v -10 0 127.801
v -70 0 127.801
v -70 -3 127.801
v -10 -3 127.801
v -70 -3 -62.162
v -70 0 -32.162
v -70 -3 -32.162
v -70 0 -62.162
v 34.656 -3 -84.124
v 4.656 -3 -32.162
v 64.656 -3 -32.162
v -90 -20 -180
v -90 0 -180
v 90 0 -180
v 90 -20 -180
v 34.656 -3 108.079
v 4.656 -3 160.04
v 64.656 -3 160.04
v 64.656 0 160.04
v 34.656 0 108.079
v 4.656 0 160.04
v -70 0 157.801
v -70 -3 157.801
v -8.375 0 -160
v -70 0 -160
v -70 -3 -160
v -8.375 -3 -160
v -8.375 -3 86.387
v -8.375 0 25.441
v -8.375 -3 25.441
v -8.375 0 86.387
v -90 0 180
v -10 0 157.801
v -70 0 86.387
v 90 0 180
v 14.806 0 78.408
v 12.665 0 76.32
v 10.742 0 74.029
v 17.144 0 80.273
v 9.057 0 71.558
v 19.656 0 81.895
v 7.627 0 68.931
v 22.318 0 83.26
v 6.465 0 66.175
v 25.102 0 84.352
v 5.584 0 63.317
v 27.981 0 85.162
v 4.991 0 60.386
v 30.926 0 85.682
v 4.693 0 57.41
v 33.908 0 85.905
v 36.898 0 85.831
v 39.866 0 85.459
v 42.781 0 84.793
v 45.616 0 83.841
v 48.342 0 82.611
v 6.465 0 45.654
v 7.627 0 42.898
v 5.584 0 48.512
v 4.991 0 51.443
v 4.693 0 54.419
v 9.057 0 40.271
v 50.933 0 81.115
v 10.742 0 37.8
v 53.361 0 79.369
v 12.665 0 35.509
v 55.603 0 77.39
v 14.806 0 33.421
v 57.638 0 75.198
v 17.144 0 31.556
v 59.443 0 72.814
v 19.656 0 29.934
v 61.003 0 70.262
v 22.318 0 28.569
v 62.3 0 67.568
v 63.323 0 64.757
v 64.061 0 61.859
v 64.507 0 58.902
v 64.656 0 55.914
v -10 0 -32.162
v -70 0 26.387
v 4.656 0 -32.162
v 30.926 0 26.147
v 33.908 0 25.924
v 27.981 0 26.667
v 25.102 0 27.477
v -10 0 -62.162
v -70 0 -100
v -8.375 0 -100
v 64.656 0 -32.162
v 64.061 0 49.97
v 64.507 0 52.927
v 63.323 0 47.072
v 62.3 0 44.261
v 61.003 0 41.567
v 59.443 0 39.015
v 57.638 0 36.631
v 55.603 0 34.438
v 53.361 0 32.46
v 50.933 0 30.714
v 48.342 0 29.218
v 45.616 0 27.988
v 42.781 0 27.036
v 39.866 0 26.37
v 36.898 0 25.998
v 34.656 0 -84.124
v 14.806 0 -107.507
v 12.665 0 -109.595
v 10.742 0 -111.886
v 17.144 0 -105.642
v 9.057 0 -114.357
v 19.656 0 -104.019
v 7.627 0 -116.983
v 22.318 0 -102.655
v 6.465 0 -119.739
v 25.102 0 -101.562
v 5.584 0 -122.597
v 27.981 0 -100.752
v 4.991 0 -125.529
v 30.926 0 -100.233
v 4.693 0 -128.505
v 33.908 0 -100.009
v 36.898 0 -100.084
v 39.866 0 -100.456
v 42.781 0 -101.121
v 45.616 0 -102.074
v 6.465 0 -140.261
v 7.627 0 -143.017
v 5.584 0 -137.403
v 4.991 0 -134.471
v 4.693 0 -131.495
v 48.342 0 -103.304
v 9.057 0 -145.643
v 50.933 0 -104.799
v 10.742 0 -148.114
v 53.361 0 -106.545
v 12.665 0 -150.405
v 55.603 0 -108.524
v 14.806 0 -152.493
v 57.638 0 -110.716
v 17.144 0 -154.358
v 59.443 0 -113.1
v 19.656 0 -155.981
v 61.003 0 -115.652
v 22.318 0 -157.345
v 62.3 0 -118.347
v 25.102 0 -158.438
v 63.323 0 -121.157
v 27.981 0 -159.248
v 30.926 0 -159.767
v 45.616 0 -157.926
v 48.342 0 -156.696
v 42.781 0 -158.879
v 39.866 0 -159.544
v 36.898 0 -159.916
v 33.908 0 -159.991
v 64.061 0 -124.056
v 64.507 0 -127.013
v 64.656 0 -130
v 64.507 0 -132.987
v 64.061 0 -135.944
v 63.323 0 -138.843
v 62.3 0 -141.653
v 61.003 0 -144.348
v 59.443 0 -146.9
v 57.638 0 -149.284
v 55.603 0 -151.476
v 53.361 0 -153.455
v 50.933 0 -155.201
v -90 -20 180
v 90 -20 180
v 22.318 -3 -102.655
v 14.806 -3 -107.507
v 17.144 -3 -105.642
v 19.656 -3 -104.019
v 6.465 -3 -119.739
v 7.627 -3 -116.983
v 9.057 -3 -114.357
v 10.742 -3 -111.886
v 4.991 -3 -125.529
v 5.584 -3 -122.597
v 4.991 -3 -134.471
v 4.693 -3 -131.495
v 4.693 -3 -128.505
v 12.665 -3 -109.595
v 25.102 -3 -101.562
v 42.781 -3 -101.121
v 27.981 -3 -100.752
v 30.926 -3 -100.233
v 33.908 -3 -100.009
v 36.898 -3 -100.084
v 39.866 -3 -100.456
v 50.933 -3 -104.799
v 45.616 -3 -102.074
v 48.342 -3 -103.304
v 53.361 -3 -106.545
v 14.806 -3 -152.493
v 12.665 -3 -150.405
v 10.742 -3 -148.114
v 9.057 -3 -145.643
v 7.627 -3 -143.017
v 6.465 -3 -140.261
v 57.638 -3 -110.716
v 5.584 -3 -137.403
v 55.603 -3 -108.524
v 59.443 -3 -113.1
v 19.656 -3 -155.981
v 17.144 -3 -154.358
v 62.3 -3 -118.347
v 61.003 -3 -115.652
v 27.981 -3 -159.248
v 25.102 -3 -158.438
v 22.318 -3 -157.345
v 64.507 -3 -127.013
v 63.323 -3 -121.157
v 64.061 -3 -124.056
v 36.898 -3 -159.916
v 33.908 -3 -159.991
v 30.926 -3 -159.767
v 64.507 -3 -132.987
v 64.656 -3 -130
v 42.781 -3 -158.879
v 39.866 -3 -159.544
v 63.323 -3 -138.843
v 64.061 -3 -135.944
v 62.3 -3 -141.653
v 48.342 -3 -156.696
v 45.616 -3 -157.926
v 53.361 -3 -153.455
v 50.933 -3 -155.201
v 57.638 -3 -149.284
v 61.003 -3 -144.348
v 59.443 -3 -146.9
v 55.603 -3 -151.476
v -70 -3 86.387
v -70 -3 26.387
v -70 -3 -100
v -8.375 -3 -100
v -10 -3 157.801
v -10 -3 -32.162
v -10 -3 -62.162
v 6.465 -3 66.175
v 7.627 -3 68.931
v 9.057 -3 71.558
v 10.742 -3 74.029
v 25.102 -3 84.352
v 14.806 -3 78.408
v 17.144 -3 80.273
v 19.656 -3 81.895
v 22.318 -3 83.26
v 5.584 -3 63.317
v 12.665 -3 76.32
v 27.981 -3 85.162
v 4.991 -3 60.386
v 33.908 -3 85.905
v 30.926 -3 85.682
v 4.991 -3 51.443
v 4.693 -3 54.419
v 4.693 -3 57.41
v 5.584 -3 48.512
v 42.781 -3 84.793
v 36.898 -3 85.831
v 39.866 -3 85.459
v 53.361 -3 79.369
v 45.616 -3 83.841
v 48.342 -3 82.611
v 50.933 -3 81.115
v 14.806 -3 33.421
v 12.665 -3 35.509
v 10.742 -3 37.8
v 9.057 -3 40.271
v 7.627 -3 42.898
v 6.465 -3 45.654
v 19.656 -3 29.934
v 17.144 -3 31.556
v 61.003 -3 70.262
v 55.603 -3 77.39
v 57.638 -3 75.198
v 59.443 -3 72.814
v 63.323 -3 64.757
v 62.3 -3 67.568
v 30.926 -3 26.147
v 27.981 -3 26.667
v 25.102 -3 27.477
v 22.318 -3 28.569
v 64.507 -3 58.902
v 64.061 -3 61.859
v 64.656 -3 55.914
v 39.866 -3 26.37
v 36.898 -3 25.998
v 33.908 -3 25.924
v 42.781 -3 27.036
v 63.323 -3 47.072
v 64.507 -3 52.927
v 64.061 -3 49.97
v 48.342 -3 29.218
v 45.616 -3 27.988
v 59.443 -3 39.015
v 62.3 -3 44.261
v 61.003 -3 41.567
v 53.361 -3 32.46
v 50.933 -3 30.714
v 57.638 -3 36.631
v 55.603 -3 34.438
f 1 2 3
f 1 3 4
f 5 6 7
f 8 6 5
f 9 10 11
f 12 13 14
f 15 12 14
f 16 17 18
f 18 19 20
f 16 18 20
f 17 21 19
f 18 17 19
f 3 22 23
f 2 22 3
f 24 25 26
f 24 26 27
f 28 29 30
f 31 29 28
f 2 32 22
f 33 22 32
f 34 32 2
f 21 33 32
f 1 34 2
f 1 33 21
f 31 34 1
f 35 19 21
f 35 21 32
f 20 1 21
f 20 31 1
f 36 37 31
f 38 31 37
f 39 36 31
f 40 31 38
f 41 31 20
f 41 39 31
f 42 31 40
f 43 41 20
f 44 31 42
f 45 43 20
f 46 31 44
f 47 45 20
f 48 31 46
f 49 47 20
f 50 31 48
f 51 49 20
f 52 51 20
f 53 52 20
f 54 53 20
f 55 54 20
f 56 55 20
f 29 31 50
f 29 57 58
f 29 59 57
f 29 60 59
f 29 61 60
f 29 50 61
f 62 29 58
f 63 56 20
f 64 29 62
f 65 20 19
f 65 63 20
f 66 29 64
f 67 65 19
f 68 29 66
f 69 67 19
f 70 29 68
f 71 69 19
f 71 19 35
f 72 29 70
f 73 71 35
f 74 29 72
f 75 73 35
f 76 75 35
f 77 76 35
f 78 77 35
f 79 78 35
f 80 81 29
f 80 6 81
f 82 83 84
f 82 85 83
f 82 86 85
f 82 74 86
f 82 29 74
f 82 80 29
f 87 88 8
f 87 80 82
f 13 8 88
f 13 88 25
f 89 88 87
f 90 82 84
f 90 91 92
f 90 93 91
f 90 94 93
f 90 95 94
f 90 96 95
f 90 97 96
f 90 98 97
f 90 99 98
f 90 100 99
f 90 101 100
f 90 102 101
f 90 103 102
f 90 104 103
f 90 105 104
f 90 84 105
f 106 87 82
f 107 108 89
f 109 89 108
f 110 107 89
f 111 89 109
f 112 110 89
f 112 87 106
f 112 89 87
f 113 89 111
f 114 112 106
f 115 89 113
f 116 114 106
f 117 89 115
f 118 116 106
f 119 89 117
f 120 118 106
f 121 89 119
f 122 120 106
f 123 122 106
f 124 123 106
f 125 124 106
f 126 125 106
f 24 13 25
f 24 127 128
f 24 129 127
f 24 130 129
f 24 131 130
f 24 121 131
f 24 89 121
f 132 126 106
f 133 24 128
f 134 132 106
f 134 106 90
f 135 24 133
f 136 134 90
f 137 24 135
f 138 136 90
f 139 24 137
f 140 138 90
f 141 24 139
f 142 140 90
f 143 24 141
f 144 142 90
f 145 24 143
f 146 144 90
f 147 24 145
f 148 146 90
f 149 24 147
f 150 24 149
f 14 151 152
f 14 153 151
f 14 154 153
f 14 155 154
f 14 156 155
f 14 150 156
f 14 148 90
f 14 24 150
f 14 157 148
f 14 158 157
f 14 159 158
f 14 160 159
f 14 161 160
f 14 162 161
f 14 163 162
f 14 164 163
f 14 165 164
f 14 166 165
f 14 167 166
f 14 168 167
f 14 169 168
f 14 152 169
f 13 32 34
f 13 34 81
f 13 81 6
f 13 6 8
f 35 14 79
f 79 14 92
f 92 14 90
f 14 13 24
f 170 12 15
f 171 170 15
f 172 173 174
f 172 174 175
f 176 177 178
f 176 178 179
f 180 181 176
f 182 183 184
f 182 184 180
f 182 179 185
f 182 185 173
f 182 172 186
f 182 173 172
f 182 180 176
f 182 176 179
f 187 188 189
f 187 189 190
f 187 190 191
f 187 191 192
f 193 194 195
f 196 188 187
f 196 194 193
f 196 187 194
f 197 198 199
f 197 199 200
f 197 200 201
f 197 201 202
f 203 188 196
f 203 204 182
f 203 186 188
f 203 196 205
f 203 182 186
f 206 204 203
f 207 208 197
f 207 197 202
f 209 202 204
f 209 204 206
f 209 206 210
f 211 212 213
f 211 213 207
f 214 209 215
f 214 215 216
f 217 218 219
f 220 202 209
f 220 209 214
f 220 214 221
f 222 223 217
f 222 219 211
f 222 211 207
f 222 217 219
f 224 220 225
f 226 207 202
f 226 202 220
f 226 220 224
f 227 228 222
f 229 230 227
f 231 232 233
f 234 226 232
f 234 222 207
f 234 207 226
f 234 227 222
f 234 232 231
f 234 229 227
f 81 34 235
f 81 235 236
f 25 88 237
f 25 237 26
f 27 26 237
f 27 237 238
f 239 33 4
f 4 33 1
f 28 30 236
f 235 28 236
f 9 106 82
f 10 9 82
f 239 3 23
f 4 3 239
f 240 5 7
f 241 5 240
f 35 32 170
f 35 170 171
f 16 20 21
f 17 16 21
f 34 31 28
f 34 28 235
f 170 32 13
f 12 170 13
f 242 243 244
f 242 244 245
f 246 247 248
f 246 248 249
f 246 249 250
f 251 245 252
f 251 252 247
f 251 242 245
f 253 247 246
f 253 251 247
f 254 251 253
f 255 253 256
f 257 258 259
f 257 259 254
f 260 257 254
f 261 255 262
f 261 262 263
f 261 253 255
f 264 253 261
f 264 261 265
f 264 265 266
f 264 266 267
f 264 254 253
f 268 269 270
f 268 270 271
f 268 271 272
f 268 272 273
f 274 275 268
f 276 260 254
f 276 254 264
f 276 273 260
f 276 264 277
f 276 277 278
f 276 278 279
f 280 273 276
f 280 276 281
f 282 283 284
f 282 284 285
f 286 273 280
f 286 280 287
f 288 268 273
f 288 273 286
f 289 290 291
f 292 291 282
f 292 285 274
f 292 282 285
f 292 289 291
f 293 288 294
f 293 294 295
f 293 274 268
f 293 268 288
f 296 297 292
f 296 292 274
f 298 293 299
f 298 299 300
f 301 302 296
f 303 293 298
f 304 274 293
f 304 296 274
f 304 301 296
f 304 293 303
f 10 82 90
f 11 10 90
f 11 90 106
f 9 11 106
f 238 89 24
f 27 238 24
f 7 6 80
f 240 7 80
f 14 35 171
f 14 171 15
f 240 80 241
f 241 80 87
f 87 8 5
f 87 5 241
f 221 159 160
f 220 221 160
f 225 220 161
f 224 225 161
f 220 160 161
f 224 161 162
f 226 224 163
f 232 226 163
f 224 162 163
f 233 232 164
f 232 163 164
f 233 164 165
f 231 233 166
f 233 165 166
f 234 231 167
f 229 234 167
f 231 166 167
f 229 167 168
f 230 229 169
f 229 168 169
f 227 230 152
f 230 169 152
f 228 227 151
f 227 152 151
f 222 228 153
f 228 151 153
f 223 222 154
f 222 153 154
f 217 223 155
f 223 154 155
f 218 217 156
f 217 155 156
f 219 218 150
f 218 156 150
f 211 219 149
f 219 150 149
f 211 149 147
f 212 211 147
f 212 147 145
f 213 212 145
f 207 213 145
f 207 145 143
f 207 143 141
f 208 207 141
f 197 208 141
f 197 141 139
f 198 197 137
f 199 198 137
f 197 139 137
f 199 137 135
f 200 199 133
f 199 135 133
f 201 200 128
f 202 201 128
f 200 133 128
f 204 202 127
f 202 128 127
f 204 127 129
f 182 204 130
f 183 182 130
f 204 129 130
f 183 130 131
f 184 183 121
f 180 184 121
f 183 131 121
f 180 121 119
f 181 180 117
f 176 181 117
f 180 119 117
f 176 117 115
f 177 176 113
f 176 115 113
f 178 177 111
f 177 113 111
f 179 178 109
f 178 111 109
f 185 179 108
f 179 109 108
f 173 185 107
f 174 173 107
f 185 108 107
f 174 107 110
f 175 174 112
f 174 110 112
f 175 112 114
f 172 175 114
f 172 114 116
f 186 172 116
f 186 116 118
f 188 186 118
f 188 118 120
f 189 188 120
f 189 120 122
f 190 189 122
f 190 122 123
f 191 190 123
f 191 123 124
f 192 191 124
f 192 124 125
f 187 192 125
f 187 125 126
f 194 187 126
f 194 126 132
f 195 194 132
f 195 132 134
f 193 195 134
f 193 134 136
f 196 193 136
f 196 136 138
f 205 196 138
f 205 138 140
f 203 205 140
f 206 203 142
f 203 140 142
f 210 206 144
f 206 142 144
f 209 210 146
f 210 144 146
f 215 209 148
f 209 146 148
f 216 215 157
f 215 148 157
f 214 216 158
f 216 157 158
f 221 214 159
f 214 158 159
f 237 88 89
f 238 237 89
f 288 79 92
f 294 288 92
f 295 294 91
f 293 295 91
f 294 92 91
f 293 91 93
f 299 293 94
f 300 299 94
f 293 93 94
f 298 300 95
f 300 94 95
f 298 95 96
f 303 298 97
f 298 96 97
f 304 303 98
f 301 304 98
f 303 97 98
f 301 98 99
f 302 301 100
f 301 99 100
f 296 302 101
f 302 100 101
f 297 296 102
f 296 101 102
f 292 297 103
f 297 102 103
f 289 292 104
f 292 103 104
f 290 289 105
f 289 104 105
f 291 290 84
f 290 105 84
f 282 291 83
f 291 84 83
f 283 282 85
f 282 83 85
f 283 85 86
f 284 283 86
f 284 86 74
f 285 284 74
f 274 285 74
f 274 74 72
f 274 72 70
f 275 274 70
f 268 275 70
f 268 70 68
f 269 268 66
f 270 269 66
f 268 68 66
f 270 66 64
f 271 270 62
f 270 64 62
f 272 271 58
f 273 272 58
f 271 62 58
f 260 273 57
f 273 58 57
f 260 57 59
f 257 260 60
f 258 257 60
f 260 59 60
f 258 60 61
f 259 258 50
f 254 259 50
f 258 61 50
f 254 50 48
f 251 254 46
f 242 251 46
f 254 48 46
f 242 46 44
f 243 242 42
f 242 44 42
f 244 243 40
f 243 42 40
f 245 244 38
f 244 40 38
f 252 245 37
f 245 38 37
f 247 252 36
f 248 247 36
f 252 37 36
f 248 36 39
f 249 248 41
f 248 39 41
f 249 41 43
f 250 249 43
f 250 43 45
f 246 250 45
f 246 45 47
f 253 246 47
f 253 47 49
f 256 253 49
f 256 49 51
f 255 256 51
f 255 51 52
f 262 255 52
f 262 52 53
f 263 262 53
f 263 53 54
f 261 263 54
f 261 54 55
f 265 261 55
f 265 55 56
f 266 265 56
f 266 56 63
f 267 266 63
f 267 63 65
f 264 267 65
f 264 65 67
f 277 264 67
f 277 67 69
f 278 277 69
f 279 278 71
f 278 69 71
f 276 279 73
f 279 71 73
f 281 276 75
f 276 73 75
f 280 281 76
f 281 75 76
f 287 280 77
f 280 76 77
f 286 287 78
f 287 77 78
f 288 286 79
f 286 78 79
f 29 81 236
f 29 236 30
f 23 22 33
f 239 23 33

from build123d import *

# Parameters (mm, degrees)
SKETCH1_W           = 180
SKETCH1_H           = 360
BOSS_EXTRUDE1_DEPTH = 20
SKETCH2_R           = 30
SKETCH2_W           = 60
SKETCH2_H           = 30
SKETCH2_W_2         = 61.624654561
SKETCH2_H_2         = 60
CUT_EXTRUDE1_DEPTH  = 3


with BuildPart() as part:
    # Sketch1 → Boss-Extrude1 (new body)
    with BuildSketch(Plane(origin=(0, 0, 0), x_dir=(1, 0, 0), z_dir=(0, 1, 0))):
        Rectangle(SKETCH1_W, SKETCH1_H)
    extrude(amount=-BOSS_EXTRUDE1_DEPTH)

    # Sketch2 → Cut-Extrude1 (cut)
    with BuildSketch(Plane(origin=(0, 0, 0), x_dir=(1, 0, 0), z_dir=(0, 1, 0))):
        with Locations((34.656170811, 130)):
            Circle(SKETCH2_R)
        with Locations((34.656170811, -55.914468779)):
            Circle(SKETCH2_R)
        with Locations((-40, 47.162192329)):
            Rectangle(SKETCH2_W, SKETCH2_H)
        with Locations((-39.18767272, 130)):
            Rectangle(SKETCH2_W_2, SKETCH2_H_2)
        Polygon((4.656170811, 32.162192329), (64.656170811, 32.162192329), (34.656170811, 84.123716556), align=None)
        Polygon((4.656170811, -160.040110734), (64.656170811, -160.040110734), (34.656170811, -108.078586507), align=None)
        with Locations((-40, -142.801384824)):
            Rectangle(SKETCH2_W, SKETCH2_H)
        Polygon((-8.375345439, -25.441495932), (-8.375345439, -86.387441626), (-70, -86.387441626), (-70, -26.387441626), align=None)
    extrude(amount=-CUT_EXTRUDE1_DEPTH, mode=Mode.SUBTRACT)


solid = part.part
